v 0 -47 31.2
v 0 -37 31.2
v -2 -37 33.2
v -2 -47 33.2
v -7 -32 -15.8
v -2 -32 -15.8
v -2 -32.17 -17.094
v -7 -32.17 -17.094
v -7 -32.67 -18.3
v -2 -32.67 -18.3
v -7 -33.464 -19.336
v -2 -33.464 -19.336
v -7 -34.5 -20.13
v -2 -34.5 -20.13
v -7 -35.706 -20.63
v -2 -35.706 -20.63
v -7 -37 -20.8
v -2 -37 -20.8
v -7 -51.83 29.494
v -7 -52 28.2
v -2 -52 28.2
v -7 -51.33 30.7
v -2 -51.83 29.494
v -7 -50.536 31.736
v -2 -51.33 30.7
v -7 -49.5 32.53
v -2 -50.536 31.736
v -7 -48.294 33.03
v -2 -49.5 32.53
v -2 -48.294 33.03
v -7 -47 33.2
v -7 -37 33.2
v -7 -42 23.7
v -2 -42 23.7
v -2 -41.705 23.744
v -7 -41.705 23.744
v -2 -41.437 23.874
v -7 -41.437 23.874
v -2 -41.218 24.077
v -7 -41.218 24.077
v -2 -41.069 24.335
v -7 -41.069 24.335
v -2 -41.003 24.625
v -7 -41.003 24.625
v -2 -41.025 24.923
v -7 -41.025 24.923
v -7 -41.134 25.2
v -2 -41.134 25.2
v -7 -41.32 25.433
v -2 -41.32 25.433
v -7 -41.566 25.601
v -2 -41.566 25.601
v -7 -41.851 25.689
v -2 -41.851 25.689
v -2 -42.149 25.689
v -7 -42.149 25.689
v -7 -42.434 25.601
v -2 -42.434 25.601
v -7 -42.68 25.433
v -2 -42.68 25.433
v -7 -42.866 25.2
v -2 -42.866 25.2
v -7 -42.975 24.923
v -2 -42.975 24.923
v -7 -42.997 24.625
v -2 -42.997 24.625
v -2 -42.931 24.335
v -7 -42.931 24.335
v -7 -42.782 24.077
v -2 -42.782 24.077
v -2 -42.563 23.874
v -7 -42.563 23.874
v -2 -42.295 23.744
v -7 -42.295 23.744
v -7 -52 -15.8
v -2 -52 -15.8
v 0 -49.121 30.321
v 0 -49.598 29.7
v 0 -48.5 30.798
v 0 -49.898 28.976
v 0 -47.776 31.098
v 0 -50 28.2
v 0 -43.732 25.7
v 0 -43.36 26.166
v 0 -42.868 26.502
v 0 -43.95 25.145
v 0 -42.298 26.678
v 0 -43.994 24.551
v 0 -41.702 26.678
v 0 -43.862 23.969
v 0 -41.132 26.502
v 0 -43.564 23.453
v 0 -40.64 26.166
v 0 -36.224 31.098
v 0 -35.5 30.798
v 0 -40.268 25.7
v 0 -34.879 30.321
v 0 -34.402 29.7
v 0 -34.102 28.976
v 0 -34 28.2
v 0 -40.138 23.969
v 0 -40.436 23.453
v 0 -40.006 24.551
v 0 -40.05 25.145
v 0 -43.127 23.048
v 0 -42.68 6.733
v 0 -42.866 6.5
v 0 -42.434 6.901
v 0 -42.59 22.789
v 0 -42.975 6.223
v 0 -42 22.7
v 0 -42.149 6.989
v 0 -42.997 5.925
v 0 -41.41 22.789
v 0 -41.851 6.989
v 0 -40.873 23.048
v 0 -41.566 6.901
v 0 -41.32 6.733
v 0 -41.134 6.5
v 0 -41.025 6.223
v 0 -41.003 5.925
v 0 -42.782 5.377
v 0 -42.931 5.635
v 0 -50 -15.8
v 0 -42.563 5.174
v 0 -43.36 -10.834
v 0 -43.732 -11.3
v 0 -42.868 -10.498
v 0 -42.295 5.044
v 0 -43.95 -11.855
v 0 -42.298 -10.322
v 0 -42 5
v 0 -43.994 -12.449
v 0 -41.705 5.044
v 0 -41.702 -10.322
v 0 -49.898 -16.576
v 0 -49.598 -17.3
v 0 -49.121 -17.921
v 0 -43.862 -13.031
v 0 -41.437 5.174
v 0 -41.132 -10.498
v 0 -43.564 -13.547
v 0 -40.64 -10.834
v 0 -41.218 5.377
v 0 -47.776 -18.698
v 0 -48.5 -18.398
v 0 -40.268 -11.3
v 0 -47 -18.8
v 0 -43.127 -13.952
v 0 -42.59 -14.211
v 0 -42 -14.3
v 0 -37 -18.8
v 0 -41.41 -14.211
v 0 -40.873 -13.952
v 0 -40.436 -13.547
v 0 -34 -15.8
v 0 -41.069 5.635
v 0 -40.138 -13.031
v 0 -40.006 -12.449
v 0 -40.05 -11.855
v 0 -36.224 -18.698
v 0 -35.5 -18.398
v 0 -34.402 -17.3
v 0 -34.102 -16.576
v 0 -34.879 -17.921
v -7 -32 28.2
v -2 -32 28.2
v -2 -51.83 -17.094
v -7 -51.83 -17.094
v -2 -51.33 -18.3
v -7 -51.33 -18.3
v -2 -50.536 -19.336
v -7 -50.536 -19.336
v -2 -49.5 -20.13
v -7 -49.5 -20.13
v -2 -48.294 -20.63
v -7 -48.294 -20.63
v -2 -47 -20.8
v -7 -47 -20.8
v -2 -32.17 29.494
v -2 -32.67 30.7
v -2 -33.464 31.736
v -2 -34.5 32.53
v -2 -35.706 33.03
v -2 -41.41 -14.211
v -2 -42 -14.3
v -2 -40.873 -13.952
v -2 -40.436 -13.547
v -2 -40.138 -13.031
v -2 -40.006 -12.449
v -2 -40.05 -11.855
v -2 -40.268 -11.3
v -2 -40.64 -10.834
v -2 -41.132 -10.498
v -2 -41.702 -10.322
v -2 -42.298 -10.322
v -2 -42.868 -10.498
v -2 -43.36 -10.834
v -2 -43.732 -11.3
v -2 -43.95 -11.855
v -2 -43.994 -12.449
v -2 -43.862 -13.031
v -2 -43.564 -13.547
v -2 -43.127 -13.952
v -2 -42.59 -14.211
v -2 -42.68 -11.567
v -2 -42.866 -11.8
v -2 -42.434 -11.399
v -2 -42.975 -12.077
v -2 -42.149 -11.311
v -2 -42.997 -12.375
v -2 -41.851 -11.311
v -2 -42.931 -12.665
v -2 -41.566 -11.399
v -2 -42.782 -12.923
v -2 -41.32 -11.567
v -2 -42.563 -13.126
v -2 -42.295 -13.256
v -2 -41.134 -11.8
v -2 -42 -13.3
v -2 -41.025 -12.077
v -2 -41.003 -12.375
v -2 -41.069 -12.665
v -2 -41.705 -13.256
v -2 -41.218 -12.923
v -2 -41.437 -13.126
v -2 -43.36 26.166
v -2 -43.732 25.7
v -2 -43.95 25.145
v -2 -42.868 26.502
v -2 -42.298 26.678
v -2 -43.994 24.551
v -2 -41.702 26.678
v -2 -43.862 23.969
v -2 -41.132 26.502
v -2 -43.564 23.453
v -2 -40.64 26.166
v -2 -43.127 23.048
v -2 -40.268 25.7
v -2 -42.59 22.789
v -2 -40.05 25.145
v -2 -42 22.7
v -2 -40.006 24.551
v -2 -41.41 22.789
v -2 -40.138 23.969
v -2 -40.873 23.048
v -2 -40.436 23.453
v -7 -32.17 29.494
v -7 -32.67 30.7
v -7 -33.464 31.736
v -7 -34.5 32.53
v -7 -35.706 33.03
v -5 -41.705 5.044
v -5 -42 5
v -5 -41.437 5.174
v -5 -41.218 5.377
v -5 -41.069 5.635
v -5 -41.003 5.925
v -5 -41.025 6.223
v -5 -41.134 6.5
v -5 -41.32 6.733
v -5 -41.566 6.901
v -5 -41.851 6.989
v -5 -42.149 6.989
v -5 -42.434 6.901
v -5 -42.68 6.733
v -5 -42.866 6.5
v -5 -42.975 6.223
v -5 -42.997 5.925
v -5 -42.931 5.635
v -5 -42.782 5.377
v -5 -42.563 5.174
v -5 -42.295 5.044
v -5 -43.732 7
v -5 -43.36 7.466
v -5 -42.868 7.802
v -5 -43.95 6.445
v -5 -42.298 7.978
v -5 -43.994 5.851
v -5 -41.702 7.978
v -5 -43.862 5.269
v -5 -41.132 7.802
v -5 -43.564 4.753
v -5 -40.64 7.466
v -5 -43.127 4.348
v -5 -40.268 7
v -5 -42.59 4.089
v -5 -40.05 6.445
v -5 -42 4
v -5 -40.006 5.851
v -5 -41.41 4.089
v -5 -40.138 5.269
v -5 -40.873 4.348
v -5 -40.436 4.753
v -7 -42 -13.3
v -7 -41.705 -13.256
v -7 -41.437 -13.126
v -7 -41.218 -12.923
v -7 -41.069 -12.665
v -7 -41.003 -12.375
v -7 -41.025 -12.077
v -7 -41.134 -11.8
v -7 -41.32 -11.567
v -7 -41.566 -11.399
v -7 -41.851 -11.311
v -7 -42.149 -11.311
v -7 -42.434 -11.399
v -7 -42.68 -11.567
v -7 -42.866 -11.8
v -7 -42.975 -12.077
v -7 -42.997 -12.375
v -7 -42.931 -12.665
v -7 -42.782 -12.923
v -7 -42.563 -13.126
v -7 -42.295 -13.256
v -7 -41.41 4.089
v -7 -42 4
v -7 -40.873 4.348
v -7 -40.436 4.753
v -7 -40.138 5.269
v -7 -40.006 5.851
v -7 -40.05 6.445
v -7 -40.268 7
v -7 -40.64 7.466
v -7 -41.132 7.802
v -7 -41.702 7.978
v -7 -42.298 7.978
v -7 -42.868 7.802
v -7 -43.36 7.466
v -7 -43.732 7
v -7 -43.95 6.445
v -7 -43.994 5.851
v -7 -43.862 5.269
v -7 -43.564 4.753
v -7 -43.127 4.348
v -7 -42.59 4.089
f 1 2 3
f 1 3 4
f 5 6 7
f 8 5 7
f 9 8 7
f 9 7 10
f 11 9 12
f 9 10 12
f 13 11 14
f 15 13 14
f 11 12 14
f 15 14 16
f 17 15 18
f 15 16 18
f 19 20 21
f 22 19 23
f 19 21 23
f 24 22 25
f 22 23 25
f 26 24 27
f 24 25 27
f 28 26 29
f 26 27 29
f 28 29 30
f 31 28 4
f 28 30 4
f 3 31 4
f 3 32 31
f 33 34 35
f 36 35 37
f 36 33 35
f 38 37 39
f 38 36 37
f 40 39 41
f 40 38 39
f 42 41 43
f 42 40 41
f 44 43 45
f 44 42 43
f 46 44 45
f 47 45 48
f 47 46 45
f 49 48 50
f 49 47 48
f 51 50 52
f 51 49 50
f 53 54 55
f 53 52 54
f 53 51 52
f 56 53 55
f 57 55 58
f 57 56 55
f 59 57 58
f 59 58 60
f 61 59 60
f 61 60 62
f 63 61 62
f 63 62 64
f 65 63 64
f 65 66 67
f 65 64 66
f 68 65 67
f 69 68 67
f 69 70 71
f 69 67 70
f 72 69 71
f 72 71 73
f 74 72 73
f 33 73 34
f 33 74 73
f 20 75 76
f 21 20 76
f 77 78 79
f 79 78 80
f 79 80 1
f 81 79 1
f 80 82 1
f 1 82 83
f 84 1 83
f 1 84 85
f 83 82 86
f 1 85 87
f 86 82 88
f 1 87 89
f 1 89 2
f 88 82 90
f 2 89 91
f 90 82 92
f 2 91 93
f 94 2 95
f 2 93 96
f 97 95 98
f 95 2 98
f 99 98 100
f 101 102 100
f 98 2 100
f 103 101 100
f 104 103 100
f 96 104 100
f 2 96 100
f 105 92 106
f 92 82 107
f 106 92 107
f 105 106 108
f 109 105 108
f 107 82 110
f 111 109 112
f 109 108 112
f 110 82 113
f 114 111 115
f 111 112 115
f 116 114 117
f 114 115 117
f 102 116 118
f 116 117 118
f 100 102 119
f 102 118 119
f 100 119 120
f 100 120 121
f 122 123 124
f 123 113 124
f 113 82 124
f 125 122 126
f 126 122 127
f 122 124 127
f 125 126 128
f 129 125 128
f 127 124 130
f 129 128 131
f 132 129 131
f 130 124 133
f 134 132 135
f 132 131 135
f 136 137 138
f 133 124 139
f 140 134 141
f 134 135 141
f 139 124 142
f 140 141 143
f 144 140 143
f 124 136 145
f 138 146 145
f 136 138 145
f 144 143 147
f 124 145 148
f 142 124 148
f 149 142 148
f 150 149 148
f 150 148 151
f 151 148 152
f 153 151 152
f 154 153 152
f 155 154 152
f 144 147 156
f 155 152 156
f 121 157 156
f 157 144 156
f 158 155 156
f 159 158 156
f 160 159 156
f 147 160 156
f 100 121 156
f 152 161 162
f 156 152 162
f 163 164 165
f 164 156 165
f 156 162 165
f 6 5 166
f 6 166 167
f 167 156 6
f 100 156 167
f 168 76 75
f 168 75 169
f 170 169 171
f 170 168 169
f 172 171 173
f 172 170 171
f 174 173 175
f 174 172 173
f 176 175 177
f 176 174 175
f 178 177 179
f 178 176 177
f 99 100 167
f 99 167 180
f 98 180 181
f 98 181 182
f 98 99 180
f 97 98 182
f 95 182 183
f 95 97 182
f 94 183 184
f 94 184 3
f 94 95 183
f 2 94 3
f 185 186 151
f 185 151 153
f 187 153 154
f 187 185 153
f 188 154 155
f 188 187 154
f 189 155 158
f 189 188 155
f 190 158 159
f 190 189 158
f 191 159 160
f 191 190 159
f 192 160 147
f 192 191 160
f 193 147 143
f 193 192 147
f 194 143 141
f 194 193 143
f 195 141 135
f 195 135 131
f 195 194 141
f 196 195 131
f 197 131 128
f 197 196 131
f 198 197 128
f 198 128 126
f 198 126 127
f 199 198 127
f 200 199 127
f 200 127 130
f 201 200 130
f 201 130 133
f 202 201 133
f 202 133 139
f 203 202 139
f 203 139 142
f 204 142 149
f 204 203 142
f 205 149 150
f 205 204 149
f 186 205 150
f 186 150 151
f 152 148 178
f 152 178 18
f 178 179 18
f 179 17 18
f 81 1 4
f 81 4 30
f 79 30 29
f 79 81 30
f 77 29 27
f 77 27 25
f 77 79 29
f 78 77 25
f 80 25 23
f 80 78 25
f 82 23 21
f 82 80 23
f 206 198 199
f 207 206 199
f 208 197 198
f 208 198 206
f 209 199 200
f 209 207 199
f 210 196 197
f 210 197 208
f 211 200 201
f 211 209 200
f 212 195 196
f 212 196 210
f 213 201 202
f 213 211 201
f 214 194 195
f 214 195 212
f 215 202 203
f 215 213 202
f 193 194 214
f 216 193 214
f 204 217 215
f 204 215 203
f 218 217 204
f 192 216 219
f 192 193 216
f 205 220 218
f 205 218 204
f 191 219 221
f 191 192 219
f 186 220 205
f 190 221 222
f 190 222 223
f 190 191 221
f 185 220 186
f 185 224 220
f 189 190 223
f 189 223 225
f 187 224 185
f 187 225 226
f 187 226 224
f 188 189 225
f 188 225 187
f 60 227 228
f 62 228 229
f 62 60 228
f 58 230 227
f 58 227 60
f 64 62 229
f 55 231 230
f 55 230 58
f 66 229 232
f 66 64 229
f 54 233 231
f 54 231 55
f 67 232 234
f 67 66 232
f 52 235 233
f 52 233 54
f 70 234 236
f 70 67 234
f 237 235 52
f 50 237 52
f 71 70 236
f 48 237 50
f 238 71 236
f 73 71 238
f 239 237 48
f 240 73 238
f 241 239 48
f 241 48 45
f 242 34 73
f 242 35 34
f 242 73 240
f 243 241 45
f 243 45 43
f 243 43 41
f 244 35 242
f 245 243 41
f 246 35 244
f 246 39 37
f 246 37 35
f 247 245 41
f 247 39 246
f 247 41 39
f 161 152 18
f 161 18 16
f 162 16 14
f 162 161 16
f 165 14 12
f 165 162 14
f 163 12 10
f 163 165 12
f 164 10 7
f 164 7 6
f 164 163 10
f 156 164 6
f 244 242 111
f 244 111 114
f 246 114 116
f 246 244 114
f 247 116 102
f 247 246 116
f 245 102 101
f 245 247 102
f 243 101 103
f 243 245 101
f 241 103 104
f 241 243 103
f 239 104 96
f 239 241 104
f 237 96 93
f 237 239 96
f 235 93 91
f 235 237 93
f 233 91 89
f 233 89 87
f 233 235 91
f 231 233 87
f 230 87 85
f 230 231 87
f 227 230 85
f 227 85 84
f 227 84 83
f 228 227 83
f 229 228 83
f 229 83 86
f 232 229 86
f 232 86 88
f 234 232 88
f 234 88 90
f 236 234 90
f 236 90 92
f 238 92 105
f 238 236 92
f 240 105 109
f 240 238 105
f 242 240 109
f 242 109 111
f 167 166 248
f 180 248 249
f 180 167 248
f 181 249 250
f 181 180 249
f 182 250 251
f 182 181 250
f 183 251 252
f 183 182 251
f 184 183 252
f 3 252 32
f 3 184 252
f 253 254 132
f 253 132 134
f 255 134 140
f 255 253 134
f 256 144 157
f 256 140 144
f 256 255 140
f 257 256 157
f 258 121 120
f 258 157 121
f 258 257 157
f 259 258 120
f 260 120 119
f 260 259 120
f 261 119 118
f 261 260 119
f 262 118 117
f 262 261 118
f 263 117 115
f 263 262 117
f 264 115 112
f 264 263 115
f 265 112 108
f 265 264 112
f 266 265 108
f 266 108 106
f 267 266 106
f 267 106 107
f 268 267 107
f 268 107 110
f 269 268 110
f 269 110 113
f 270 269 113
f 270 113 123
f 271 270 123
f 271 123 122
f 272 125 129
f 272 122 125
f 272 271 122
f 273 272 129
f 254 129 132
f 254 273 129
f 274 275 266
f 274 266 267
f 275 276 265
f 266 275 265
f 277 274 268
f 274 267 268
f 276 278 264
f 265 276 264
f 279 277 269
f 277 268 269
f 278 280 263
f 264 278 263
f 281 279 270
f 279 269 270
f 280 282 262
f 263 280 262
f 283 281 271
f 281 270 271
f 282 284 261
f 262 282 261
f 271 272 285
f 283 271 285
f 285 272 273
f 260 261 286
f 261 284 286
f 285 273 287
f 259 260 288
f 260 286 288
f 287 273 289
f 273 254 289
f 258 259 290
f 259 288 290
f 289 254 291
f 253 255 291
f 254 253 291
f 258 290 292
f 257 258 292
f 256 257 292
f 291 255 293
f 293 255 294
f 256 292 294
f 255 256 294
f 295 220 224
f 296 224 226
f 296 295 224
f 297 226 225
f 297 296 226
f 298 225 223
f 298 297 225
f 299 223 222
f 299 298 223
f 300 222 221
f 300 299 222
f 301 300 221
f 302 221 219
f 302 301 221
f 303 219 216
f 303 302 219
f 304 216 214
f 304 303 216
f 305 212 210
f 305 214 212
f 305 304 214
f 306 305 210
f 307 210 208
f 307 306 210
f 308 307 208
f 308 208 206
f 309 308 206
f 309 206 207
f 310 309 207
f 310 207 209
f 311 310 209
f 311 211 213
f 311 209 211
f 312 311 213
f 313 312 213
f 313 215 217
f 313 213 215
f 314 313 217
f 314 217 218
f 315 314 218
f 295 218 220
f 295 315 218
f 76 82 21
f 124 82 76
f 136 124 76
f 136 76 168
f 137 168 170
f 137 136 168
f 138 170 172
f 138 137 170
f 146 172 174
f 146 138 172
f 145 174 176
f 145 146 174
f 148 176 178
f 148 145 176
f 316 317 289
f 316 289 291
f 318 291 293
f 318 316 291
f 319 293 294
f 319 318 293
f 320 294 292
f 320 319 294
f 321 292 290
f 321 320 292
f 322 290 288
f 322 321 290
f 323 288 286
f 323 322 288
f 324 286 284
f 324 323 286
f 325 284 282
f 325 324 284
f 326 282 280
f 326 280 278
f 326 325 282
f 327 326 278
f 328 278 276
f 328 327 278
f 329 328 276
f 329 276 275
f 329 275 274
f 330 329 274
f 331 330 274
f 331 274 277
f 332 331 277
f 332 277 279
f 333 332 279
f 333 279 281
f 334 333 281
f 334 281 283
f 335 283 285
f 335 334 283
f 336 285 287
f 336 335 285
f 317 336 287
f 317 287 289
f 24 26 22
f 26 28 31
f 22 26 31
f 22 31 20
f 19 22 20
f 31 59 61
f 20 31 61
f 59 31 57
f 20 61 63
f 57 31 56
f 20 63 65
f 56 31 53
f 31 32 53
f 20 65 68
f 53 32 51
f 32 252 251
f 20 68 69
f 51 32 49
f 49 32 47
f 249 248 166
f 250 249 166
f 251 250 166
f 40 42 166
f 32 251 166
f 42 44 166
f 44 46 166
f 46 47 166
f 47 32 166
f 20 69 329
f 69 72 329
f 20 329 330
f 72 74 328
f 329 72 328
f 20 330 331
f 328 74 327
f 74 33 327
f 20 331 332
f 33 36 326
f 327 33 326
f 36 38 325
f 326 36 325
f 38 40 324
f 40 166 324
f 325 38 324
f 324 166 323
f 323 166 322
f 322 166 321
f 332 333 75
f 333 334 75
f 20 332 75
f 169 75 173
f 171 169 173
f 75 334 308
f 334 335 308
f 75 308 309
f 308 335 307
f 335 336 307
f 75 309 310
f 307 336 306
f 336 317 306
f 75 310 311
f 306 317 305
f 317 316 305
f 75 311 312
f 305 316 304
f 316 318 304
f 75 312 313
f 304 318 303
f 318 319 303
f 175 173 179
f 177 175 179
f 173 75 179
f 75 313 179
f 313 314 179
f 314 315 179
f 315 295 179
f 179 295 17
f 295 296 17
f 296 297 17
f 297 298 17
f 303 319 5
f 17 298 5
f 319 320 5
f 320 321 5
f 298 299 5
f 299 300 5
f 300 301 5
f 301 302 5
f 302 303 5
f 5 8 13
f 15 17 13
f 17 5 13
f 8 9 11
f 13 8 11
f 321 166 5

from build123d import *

# Parameters (mm, degrees)
CYLINDER032_R           = 2
CYLINDER032_DEPTH       = 2
CYLINDER032_PITCH_ANGLE = 90
CYLINDER033_R           = 2
CYLINDER033_DEPTH       = 2
CYLINDER033_PITCH_ANGLE = 90
CYLINDER030_R           = 1
CYLINDER030_DEPTH       = 7
CYLINDER030_PITCH_ANGLE = 90
CYLINDER031_R           = 1
CYLINDER031_DEPTH       = 7
CYLINDER031_PITCH_ANGLE = 90
CYLINDER029_R           = 2
CYLINDER029_DEPTH       = 7
CYLINDER029_PITCH_ANGLE = 90
CYLINDER028_R           = 2
CYLINDER028_DEPTH       = 7
CYLINDER028_PITCH_ANGLE = 90
CYLINDER027_R           = 2
CYLINDER027_DEPTH       = 2
CYLINDER027_PITCH_ANGLE = 90
CYLINDER026_R           = 1
CYLINDER026_DEPTH       = 10
CYLINDER026_PITCH_ANGLE = 90
CYLINDER024_R           = 2
CYLINDER024_DEPTH       = 10
CYLINDER024_PITCH_ANGLE = 90
CYLINDER025_R           = 2
CYLINDER025_DEPTH       = 10
CYLINDER025_PITCH_ANGLE = 90
BOX038_W                = 7
BOX038_H                = 20
BOX038_DEPTH            = 54
FILLET010_R             = 5
CHAMFER019_SIZE         = 2


with BuildPart() as cylinder032:
    # Cylinder032 → Cylinder032 (new body)
    with BuildSketch(Plane.XY):
        Circle(CYLINDER032_R)
    extrude(amount=CYLINDER032_DEPTH)


with BuildPart() as cylinder032_1:
    # Cylinder032 pitch: moved
    add(cylinder032.part.rotate(Axis((0, 0, 0), (0, 1, 0)), CYLINDER032_PITCH_ANGLE))


with BuildPart() as cylinder032_2:
    # Cylinder032 placement: moved
    add(cylinder032_1.part.moved(Location((-2, -42, -12.3))))


with BuildPart() as cylinder033:
    # Cylinder033 → Cylinder033 (new body)
    with BuildSketch(Plane.XY):
        Circle(CYLINDER033_R)
    extrude(amount=CYLINDER033_DEPTH)


with BuildPart() as cylinder033_1:
    # Cylinder033 pitch: moved
    add(cylinder033.part.rotate(Axis((0, 0, 0), (0, 1, 0)), CYLINDER033_PITCH_ANGLE))


with BuildPart() as cylinder033_2:
    # Cylinder033 placement: moved
    add(cylinder033_1.part.moved(Location((-2, -42, 24.7))))


with BuildPart() as cylinder030:
    # Cylinder030 → Cylinder030 (new body)
    with BuildSketch(Plane.XY):
        Circle(CYLINDER030_R)
    extrude(amount=CYLINDER030_DEPTH)


with BuildPart() as cylinder030_1:
    # Cylinder030 pitch: moved
    add(cylinder030.part.rotate(Axis((0, 0, 0), (0, 1, 0)), CYLINDER030_PITCH_ANGLE))


with BuildPart() as cylinder030_2:
    # Cylinder030 placement: moved
    add(cylinder030_1.part.moved(Location((-7, -42, -12.3))))


with BuildPart() as cylinder031:
    # Cylinder031 → Cylinder031 (new body)
    with BuildSketch(Plane.XY):
        Circle(CYLINDER031_R)
    extrude(amount=CYLINDER031_DEPTH)


with BuildPart() as cylinder031_1:
    # Cylinder031 pitch: moved
    add(cylinder031.part.rotate(Axis((0, 0, 0), (0, 1, 0)), CYLINDER031_PITCH_ANGLE))


with BuildPart() as cylinder031_2:
    # Cylinder031 placement: moved
    add(cylinder031_1.part.moved(Location((-7, -42, 24.7))))


with BuildPart() as cylinder029:
    # Cylinder029 → Cylinder029 (new body)
    with BuildSketch(Plane.XY):
        Circle(CYLINDER029_R)
    extrude(amount=CYLINDER029_DEPTH)


with BuildPart() as cylinder029_1:
    # Cylinder029 pitch: moved
    add(cylinder029.part.rotate(Axis((0, 0, 0), (0, 1, 0)), CYLINDER029_PITCH_ANGLE))


with BuildPart() as cylinder029_2:
    # Cylinder029 placement: moved
    add(cylinder029_1.part.moved(Location((-7, -42, 24.7))))


with BuildPart() as cylinder028:
    # Cylinder028 → Cylinder028 (new body)
    with BuildSketch(Plane.XY):
        Circle(CYLINDER028_R)
    extrude(amount=CYLINDER028_DEPTH)


with BuildPart() as cylinder028_1:
    # Cylinder028 pitch: moved
    add(cylinder028.part.rotate(Axis((0, 0, 0), (0, 1, 0)), CYLINDER028_PITCH_ANGLE))


with BuildPart() as cylinder028_2:
    # Cylinder028 placement: moved
    add(cylinder028_1.part.moved(Location((-7, -42, -12.3))))


with BuildPart() as cylinder027:
    # Cylinder027 → Cylinder027 (new body)
    with BuildSketch(Plane.XY):
        Circle(CYLINDER027_R)
    extrude(amount=CYLINDER027_DEPTH)


with BuildPart() as cylinder027_1:
    # Cylinder027 pitch: moved
    add(cylinder027.part.rotate(Axis((0, 0, 0), (0, 1, 0)), CYLINDER027_PITCH_ANGLE))


with BuildPart() as cylinder027_2:
    # Cylinder027 placement: moved
    add(cylinder027_1.part.moved(Location((-7, -42, 6))))


with BuildPart() as cylinder026:
    # Cylinder026 → Cylinder026 (new body)
    with BuildSketch(Plane.XY):
        Circle(CYLINDER026_R)
    extrude(amount=CYLINDER026_DEPTH)


with BuildPart() as cylinder026_1:
    # Cylinder026 pitch: moved
    add(cylinder026.part.rotate(Axis((0, 0, 0), (0, 1, 0)), CYLINDER026_PITCH_ANGLE))


with BuildPart() as cylinder026_2:
    # Cylinder026 placement: moved
    add(cylinder026_1.part.moved(Location((-7, -42, 6))))


with BuildPart() as cylinder024:
    # Cylinder024 → Cylinder024 (new body)
    with BuildSketch(Plane.XY):
        Circle(CYLINDER024_R)
    extrude(amount=CYLINDER024_DEPTH)


with BuildPart() as cylinder024_1:
    # Cylinder024 pitch: moved
    add(cylinder024.part.rotate(Axis((0, 0, 0), (0, 1, 0)), CYLINDER024_PITCH_ANGLE))


with BuildPart() as cylinder024_2:
    # Cylinder024 placement: moved
    add(cylinder024_1.part.moved(Location((-8, -42, 24.7))))


with BuildPart() as cylinder025:
    # Cylinder025 → Cylinder025 (new body)
    with BuildSketch(Plane.XY):
        Circle(CYLINDER025_R)
    extrude(amount=CYLINDER025_DEPTH)


with BuildPart() as cylinder025_1:
    # Cylinder025 pitch: moved
    add(cylinder025.part.rotate(Axis((0, 0, 0), (0, 1, 0)), CYLINDER025_PITCH_ANGLE))


with BuildPart() as cylinder025_2:
    # Cylinder025 placement: moved
    add(cylinder025_1.part.moved(Location((-8, -42, -12.3))))


with BuildPart() as cut046:
    # Box038 → Box038 (new body)
    with BuildSketch(Plane(origin=(-7, -52, -20.8), x_dir=(1, 0, 0), z_dir=(0, 0, 1))):
        with Locations((3.5, 10)):
            Rectangle(BOX038_W, BOX038_H)
    extrude(amount=BOX038_DEPTH)

    # Fillet010
    fillet010_edges = [cut046.edges().sort_by_distance(p)[0] for p in [
        (-3.5, -52, -20.8),
        (-3.5, -52, 33.2),
        (-3.5, -32, -20.8),
        (-3.5, -32, 33.2),
    ]]
    fillet(fillet010_edges, radius=FILLET010_R)

    # Chamfer019
    chamfer019_edges = [cut046.edges().sort_by_distance(p)[0] for p in [
        (0, -42, -20.8),
    ]]
    chamfer(chamfer019_edges, length=CHAMFER019_SIZE)

    # Cut038: cut Cylinder025
    add(cylinder025_2.part, mode=Mode.SUBTRACT)

    # Cut039: cut Cylinder024
    add(cylinder024_2.part, mode=Mode.SUBTRACT)

    # Cut041: cut Cylinder026
    add(cylinder026_2.part, mode=Mode.SUBTRACT)

    # Cut042: cut Cylinder027
    add(cylinder027_2.part, mode=Mode.SUBTRACT)

    # Fusion023: union Cylinder028
    add(cylinder028_2.part)

    # Fusion024: union Cylinder029
    add(cylinder029_2.part)

    # Cut043: cut Cylinder031
    add(cylinder031_2.part, mode=Mode.SUBTRACT)

    # Cut044: cut Cylinder030
    add(cylinder030_2.part, mode=Mode.SUBTRACT)

    # Cut045: cut Cylinder033
    add(cylinder033_2.part, mode=Mode.SUBTRACT)

    # Cut046: cut Cylinder032
    add(cylinder032_2.part, mode=Mode.SUBTRACT)


solid = cut046.part
